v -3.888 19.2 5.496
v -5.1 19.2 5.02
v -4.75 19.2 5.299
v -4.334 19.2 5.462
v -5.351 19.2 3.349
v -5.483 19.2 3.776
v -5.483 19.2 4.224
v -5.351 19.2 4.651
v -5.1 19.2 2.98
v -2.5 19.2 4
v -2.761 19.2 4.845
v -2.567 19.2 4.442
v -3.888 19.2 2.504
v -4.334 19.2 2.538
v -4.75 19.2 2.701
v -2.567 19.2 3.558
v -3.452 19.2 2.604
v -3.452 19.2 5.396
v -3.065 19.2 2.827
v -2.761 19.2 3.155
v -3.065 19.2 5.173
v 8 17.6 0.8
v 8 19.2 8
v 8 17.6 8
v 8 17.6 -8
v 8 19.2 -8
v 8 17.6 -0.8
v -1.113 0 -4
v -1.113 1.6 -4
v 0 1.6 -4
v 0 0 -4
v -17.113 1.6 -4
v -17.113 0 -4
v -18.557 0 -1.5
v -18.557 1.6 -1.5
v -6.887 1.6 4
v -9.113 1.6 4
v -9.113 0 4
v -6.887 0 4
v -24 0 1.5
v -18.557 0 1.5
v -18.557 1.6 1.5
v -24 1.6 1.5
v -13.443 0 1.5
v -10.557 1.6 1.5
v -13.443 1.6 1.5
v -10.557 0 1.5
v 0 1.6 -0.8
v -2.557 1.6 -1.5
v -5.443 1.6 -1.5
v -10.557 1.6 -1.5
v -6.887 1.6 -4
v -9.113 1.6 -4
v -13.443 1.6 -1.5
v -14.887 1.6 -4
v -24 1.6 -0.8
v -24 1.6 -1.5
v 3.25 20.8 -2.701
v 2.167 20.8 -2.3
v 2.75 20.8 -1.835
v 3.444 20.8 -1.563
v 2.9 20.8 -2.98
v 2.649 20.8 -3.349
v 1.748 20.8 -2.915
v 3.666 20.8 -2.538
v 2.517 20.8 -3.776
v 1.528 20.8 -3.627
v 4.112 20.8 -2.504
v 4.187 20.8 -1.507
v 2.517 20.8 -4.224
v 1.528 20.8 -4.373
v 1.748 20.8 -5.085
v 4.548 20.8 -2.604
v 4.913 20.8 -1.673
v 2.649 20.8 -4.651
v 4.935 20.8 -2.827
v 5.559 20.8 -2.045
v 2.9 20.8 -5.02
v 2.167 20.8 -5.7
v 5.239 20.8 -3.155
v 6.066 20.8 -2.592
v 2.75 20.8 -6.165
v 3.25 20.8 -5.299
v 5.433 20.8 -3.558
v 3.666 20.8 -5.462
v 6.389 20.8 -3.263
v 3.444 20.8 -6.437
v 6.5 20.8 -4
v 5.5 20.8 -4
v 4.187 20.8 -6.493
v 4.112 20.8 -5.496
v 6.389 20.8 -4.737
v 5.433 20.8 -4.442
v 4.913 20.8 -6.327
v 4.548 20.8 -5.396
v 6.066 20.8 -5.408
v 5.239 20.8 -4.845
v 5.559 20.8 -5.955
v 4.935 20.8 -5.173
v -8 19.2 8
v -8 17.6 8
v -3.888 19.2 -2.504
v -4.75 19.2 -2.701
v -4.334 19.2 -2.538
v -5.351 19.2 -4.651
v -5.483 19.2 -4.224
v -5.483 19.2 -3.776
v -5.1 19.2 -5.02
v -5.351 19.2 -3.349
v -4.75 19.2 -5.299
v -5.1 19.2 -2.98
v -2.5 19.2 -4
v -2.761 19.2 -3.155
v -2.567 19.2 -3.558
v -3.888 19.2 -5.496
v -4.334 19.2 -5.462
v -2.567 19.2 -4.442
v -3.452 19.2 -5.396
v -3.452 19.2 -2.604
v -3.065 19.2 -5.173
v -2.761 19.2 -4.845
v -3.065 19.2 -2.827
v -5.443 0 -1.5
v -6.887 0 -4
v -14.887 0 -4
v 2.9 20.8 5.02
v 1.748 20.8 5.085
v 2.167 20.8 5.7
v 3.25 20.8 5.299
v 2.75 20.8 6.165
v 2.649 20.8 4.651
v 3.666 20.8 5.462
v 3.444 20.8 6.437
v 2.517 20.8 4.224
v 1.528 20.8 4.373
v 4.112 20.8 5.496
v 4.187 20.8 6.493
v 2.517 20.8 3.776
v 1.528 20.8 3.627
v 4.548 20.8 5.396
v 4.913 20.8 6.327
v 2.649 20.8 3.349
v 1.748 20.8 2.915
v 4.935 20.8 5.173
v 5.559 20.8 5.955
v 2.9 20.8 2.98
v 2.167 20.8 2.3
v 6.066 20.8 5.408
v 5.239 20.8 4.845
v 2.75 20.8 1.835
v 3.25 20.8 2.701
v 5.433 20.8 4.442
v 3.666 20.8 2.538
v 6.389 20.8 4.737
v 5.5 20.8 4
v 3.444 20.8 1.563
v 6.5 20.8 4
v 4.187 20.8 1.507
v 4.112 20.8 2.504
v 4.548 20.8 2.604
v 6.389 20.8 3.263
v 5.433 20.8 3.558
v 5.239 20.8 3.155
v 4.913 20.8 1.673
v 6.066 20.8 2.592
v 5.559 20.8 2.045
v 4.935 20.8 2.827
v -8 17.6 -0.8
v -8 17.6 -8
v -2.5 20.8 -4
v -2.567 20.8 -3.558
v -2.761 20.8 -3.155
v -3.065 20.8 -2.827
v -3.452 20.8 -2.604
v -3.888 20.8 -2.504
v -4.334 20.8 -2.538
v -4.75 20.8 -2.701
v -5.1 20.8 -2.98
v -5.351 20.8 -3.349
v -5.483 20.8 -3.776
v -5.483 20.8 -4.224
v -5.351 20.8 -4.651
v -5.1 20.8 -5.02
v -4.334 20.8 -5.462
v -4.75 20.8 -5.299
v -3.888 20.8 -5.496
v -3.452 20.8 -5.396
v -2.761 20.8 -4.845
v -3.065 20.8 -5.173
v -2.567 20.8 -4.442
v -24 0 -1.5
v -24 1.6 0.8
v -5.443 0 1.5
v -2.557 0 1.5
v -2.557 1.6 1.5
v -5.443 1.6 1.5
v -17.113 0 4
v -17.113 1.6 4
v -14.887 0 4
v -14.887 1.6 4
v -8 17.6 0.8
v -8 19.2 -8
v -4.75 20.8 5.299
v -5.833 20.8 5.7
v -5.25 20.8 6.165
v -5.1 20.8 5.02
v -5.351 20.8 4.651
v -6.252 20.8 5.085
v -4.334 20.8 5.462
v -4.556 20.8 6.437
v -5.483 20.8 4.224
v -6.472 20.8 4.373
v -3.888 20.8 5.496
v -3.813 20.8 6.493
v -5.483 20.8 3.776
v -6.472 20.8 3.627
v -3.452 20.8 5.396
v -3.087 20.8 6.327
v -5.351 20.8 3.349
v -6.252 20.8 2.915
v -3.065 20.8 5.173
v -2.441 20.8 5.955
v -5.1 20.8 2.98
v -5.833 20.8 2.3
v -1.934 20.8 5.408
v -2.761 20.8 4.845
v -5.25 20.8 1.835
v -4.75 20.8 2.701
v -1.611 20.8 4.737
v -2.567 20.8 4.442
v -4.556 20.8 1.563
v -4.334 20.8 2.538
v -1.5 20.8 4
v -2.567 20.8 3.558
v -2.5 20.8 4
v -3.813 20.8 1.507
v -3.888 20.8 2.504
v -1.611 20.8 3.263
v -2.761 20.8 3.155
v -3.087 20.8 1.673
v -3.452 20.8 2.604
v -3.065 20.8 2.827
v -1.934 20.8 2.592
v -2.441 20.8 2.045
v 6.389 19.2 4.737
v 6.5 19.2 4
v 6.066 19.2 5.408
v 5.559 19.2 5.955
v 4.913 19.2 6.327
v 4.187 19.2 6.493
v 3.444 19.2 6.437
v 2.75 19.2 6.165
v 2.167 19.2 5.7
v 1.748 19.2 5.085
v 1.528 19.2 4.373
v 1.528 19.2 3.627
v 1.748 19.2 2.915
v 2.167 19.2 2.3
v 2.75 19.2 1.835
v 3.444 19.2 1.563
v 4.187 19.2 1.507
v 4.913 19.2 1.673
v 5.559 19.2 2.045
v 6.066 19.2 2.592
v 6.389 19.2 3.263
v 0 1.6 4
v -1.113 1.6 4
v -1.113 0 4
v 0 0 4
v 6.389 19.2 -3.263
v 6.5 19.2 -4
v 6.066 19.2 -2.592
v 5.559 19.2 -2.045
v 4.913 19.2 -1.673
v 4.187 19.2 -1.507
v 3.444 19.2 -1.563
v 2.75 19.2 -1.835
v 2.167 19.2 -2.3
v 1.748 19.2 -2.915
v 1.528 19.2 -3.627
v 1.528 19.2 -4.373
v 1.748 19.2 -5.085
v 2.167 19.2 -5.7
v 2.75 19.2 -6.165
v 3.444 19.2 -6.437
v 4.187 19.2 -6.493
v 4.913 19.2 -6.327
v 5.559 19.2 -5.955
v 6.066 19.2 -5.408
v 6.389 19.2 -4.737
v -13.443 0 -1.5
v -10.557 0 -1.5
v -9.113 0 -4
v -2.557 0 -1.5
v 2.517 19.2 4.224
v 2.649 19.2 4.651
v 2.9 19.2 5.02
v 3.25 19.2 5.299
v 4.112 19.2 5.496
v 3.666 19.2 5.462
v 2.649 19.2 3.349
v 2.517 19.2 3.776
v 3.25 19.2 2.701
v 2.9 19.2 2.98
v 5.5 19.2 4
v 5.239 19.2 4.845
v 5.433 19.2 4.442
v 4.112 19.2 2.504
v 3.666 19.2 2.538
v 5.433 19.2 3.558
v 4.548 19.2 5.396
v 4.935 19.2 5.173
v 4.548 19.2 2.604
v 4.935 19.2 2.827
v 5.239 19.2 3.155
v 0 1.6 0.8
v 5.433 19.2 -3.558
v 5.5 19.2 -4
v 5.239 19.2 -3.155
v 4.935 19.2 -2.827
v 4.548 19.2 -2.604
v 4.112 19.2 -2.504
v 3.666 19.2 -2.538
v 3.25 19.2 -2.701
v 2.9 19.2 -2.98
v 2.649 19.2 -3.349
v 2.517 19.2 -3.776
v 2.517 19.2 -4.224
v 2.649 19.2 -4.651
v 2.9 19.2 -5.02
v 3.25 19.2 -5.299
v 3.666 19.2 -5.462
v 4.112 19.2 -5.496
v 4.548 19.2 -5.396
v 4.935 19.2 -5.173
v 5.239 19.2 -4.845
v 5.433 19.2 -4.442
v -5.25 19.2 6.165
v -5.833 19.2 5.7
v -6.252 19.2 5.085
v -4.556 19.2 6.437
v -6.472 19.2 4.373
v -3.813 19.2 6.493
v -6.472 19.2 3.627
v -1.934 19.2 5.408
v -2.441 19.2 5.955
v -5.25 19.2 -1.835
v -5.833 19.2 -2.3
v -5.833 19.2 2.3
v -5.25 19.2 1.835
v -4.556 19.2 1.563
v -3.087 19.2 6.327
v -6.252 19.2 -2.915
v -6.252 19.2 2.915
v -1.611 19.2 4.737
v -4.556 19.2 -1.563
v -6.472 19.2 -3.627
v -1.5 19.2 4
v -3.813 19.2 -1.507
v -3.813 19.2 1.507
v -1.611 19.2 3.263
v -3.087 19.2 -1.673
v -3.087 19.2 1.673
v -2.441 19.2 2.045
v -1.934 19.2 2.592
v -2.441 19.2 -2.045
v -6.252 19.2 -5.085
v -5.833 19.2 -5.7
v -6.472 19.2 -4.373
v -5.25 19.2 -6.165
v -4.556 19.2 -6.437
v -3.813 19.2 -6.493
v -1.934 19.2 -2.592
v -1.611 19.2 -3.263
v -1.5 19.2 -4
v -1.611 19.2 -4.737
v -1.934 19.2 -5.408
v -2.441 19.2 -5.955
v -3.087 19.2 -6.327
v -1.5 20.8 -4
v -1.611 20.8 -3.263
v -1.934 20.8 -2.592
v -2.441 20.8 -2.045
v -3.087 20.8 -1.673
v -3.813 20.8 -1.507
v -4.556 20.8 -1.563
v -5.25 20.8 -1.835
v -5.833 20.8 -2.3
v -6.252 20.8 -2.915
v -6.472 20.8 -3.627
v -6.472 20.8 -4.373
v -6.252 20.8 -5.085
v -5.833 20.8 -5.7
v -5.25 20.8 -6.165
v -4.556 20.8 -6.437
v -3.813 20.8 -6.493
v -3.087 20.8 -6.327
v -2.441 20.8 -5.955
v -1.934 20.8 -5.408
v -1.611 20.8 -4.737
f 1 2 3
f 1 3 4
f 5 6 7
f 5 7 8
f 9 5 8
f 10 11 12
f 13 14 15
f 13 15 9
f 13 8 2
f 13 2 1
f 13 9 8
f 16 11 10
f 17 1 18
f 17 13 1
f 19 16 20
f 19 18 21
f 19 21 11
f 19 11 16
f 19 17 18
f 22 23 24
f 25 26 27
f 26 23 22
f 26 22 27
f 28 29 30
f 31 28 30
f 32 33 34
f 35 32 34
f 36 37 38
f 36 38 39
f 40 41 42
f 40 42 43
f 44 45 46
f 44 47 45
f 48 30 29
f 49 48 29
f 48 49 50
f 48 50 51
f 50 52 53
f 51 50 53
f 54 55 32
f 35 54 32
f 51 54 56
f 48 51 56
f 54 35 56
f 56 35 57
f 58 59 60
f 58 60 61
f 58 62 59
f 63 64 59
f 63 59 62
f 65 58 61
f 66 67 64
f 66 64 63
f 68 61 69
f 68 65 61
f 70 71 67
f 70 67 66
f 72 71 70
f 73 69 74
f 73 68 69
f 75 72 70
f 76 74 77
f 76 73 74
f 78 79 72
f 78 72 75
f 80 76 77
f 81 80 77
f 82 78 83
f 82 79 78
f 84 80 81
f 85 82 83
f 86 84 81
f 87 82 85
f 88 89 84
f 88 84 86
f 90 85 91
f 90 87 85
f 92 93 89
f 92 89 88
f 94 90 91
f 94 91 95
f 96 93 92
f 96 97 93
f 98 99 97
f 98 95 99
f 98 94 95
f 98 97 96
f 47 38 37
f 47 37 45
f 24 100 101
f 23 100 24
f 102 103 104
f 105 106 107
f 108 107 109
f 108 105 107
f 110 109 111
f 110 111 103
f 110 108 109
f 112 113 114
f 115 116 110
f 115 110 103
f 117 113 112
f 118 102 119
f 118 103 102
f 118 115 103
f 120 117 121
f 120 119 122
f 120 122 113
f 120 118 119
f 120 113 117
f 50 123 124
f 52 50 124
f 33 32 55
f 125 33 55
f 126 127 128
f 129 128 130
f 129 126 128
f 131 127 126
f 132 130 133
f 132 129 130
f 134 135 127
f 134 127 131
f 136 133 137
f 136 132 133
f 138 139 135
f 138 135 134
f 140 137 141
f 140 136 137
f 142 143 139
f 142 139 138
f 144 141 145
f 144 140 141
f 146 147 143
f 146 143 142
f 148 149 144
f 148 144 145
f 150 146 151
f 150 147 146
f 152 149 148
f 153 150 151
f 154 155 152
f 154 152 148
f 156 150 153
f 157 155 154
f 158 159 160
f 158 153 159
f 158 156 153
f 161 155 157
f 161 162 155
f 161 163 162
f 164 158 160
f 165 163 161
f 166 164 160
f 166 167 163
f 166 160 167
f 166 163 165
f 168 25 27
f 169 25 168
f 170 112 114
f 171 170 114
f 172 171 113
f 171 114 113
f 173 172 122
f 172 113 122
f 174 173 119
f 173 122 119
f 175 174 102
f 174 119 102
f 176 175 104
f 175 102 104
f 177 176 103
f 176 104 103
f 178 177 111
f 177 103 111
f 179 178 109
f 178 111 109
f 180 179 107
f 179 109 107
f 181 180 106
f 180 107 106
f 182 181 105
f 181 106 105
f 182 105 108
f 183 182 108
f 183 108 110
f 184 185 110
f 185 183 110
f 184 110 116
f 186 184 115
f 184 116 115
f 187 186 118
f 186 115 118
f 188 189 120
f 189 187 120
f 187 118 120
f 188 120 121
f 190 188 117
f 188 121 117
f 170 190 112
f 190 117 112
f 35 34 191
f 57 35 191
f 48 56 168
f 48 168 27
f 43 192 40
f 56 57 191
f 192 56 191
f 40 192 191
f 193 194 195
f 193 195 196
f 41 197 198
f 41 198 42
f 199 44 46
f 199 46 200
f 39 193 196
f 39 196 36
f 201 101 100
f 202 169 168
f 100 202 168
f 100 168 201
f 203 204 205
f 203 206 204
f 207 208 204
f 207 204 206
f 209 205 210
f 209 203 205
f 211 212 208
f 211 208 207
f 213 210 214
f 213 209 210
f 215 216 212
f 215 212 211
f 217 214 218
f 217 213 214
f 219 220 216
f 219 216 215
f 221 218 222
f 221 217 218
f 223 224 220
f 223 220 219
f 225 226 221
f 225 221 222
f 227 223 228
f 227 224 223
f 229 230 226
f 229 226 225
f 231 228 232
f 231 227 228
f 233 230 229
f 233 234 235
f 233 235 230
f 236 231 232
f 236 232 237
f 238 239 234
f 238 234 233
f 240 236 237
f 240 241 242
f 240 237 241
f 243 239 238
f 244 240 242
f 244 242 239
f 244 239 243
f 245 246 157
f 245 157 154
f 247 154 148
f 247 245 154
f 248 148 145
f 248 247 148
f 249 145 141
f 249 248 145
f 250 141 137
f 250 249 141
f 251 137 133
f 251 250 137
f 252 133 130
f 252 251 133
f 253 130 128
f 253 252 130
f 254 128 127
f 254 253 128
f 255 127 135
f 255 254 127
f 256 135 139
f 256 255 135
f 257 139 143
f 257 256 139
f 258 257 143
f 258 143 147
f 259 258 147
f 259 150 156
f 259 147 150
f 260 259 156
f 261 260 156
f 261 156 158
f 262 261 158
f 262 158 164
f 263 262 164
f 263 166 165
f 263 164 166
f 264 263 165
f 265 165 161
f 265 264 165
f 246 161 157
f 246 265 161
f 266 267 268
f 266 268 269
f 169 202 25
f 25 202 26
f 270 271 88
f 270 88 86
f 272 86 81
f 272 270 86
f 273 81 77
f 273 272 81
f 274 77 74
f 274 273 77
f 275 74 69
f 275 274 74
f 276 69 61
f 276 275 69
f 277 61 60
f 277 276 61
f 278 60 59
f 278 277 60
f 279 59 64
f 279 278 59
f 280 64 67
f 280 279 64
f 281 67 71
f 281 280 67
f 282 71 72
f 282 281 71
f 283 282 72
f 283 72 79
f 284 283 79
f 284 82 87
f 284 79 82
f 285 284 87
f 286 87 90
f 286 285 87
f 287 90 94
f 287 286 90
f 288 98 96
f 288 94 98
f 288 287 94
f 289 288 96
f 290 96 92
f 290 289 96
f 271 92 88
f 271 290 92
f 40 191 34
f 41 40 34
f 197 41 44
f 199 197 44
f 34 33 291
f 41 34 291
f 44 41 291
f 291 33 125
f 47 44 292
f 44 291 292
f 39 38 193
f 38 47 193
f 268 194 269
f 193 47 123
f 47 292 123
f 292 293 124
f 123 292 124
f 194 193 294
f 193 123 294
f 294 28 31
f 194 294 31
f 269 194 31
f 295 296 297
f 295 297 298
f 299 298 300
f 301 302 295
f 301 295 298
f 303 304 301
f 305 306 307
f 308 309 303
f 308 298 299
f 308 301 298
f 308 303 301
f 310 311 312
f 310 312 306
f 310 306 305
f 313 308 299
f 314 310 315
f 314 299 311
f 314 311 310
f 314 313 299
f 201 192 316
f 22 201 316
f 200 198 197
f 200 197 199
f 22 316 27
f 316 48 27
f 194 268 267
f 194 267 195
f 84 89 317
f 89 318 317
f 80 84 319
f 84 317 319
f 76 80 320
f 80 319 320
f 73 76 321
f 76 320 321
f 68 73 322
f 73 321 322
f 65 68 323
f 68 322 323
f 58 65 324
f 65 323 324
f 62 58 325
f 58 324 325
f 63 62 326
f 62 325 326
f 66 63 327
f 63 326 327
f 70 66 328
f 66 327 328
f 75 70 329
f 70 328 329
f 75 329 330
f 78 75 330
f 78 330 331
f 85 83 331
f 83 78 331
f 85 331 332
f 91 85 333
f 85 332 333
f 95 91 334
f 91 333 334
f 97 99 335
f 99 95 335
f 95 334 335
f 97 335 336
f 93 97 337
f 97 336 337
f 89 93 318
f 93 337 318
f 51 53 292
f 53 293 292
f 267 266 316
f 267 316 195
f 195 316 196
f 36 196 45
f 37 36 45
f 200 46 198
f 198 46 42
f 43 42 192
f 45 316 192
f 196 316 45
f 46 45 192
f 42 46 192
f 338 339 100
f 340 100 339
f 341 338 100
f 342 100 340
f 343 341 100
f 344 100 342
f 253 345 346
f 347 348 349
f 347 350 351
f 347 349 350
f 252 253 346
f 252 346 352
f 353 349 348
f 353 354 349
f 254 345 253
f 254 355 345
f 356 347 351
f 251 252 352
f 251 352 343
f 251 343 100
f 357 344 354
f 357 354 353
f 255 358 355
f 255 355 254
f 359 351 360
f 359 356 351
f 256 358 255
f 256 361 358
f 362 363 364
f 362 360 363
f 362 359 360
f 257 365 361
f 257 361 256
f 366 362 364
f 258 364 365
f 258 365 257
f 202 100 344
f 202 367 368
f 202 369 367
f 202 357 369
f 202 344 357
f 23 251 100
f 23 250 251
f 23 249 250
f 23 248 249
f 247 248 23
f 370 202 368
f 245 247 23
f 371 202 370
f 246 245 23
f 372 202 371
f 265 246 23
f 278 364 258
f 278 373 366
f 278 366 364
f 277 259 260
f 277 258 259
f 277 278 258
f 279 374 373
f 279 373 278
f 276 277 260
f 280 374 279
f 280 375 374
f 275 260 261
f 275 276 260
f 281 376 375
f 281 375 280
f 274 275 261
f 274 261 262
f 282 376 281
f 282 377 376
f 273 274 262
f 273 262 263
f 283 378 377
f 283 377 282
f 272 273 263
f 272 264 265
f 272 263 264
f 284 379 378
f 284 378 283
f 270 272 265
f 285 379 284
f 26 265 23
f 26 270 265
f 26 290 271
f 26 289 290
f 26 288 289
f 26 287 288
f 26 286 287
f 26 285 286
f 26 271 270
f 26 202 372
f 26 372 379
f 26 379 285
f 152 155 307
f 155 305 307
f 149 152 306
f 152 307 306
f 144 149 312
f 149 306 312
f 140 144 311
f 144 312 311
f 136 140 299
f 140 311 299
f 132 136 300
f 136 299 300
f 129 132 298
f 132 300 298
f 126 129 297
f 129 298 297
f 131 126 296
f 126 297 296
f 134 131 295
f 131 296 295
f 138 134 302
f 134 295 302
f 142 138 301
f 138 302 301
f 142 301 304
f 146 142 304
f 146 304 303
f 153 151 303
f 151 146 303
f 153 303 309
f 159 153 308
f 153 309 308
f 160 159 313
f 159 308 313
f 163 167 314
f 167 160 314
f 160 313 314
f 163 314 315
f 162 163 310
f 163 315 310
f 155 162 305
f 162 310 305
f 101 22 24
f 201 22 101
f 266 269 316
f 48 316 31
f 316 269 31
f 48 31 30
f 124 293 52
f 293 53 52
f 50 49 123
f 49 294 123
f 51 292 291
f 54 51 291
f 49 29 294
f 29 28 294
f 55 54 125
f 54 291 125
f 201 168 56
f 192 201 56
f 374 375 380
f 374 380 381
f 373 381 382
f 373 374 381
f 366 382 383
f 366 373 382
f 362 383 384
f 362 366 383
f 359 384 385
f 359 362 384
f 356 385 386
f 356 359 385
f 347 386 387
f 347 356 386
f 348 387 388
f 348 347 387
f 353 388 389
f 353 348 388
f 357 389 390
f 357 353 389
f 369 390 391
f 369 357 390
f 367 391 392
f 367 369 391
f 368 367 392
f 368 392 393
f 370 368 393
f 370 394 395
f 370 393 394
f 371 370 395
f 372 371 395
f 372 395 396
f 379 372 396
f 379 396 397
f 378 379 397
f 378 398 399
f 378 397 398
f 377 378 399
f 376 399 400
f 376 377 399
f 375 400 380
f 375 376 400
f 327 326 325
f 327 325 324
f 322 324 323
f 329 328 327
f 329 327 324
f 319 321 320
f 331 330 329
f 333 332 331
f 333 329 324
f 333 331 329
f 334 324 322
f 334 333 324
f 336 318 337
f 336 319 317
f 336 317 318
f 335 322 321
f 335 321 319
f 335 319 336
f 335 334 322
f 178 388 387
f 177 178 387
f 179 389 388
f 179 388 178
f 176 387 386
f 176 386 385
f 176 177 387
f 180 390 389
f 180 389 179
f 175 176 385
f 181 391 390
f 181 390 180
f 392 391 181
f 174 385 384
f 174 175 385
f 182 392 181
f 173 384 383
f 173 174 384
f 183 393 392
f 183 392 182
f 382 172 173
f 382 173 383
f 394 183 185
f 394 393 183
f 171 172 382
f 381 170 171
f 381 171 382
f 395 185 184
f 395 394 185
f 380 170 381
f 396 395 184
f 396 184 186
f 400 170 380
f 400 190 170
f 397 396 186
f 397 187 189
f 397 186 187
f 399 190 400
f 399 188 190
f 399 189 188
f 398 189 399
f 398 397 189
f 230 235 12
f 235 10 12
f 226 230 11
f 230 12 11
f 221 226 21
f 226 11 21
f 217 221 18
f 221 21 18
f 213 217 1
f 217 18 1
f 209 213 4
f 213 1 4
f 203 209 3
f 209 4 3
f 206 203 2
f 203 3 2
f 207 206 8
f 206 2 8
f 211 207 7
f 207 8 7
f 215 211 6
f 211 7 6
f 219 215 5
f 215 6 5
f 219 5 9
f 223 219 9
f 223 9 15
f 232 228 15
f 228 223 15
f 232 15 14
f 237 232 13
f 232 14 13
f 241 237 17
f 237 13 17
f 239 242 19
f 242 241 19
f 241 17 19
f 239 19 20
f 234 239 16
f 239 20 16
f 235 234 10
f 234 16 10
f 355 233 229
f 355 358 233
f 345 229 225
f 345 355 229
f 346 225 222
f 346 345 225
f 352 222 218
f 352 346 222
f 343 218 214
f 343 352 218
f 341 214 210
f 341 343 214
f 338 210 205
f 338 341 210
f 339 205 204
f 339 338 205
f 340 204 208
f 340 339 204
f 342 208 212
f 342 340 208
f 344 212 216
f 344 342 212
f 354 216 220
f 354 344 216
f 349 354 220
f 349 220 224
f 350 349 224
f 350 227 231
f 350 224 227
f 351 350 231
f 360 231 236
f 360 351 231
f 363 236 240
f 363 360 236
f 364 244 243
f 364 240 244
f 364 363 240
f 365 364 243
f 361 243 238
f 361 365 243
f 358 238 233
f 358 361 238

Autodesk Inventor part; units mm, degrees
ref_plane "YZ Plane" through (0, 0, 0) normal (1, 0, 0) x (0, 1, 0)
ref_plane "XZ Plane" through (0, 0, 0) normal (0, 1, 0) x (-1, 0, 0)
ref_plane "XY Plane" through (0, 0, 0) normal (0, 0, 1) x (1, 0, 0)
sketch "Sketch1" plane through (0, 0, 0) normal (0, 0, 1) x (1, 0, 0)
  line L0 (0, 0) -> (0, 1.6)
  line L1 (0, 1.6) -> (-24, 1.6)
  line L2 (-24, 1.6) -> (-24, 0)
  line L3 (-24, 0) -> (0, 0)
  line L4 (0, 1.6) -> (8, 17.6)
  line L5 (8, 17.6) -> (-8, 17.6)
  line L6 (-8, 17.6) -> (-24, 1.6)
  line L7 (-8, 17.6) -> (-8, 19.2)
  line L8 (-8, 19.2) -> (8, 19.2)
  line L9 (8, 19.2) -> (8, 17.6)
  dimension "d0" = 16
  dimension "d1" = 24
  dimension "d2" = 1.6
  dimension "d3" = 1.6
  dimension "d4" = 19.2
  dimension "d5" = 8
extrude "Extrusion1" add sketch "Sketch1" along normal mid plane 16 contours L5 L7 L8 L9
extrude "Extrusion2" add sketch "Sketch1" along normal mid plane 8 contours L3 L2 L1 L0
extrude "Extrusion3" add sketch "Sketch1" along normal mid plane 1.6 contours L1 L6 L5 L4
sketch "Sketch2" plane through (-8, 19.2, 8) normal (0, 1, 0) x (1, 0, 0)
  line L0 (16, 16) -> (0, 16) projected
  line L1 (0, 16) -> (0, 0) projected
  circle A0 centre (4, 12) radius 2.5
  circle A1 centre (4, 12) radius 1.5
  circle A2 centre (12, 12) radius 1.5
  circle A3 centre (12, 12) radius 2.5
  circle A4 centre (4, 4) radius 1.5
  circle A5 centre (4, 4) radius 2.5
  circle A6 centre (12, 4) radius 1.5
  circle A7 centre (12, 4) radius 2.5
  point P0 (8, 8)
  dimension "d12" = 5
  dimension "d13" = 4
  dimension "d14" = 8
  dimension "d15" = 4
  dimension "d16" = 8
  dimension "d17" = 3
extrude "Extrusion4" add sketch "Sketch2" along normal blind 1.6
sketch "Sketch3" plane through (-24, 0, 4) normal (0, -1, 0) x (1, 0, 0)
  line L0 (24, 0) -> (0, 0) projected
  line L1 (0, -8) -> (0, 0) projected
  line L2 (0, -8) -> (24, -8) projected
  line L3 (24, 0) -> (24, -8) projected
  line L4 (22.8868, 0) -> (21.4434, -2.5)
  line L5 (21.4434, -2.5) -> (18.5566, -2.5)
  line L6 (18.5566, -2.5) -> (17.1132, 0)
  circle A0 centre (20, 0) radius 2.5 construction
  line L7 (14.8868, 0) -> (13.4434, -2.5)
  line L8 (13.4434, -2.5) -> (10.5566, -2.5)
  line L9 (10.5566, -2.5) -> (9.1132, 0)
  circle A1 centre (12, 0) radius 2.5 construction
  line L10 (6.8868, 0) -> (5.4434, -2.5)
  line L11 (5.4434, -2.5) -> (2.5566, -2.5)
  line L12 (2.5566, -2.5) -> (1.1132, 0)
  circle A2 centre (4, 0) radius 2.5 construction
  line L13 (0, -4) -> (24, -4) construction
  line L14 (0, -4) -> (24, -4)
  line L15 (22.8868, -8) -> (21.4434, -5.5)
  line L16 (21.4434, -5.5) -> (18.5566, -5.5)
  line L17 (18.5566, -5.5) -> (17.1132, -8)
  line L18 (10.5566, -5.5) -> (9.1132, -8)
  line L19 (13.4434, -5.5) -> (10.5566, -5.5)
  line L20 (14.8868, -8) -> (13.4434, -5.5)
  line L21 (2.5566, -5.5) -> (1.1132, -8)
  line L22 (5.4434, -5.5) -> (2.5566, -5.5)
  line L23 (6.8868, -8) -> (5.4434, -5.5)
  line L24 (2.5566, -5.5) -> (0, -5.5)
  line L25 (2.5566, -2.5) -> (0, -2.5)
  line L26 (1.1132, -8) -> (6.8868, -8)
  line L27 (9.1132, -8) -> (14.8868, -8)
  line L28 (17.1132, -8) -> (22.8868, -8)
  line L29 (22.8868, 0) -> (17.1132, 0)
  line L30 (14.8868, 0) -> (9.1132, 0)
  line L31 (6.8868, 0) -> (1.1132, 0)
  line L32 (1.1132, 0) -> (0, 0)
  line L33 (0, 0) -> (0, -2.5)
  line L34 (0, -5.5) -> (0, -8)
  line L35 (0, -8) -> (1.1132, -8)
  point P0 (20, -8)
  point P1 (12, -8)
  point P2 (4, -8)
  dimension "d20" = 5
  dimension "d21" = 4
  dimension "d22" = 120
  dimension "d25" = 8
extrude "Extrusion5" cut sketch "Sketch3" against normal blind 1.6 contours L4 L5 L6 L0 | L7 L8 L9 L0 | L2 L17 L16 L15 | L24 L21 L2 L1 | L1 L0 L12 L25 | L22 L23 L2 L21 | L12 L0 L10 L11 | L2 L18 L19 L20
properties part number "3479" material "Steel"
